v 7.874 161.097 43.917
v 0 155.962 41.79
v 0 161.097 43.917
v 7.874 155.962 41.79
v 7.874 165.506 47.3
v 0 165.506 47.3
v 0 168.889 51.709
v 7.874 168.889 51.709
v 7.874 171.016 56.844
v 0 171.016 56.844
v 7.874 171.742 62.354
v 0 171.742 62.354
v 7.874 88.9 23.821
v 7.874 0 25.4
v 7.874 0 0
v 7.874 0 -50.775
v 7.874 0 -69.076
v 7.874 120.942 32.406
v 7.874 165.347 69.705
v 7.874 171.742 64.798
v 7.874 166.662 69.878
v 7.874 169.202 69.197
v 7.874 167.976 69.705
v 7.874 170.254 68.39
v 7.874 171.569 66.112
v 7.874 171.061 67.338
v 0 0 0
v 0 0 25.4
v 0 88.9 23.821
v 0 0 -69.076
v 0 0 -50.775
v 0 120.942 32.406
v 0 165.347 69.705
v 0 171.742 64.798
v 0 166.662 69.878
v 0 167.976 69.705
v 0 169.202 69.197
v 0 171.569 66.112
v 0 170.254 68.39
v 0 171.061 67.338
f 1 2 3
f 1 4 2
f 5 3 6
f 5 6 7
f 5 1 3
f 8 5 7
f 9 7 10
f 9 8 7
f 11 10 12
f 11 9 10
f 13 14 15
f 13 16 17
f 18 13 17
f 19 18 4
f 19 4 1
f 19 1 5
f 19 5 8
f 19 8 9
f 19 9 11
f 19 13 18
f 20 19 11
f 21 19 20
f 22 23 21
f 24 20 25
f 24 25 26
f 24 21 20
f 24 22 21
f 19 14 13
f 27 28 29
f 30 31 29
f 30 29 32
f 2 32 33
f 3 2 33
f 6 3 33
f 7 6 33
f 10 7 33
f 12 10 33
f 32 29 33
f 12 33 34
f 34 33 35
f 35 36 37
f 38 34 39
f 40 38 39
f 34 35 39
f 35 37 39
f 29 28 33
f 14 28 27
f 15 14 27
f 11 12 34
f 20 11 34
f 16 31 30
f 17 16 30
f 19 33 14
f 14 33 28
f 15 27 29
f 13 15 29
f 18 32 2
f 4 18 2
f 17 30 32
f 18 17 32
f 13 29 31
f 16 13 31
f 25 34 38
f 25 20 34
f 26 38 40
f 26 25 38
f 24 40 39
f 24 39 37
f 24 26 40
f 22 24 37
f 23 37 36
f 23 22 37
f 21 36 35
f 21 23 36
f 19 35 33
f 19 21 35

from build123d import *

# Parameters (mm, degrees)
F1_DEPTH = 7.874
F2_R     = 21.289722
F3_R     = 5.08


with BuildPart() as f1:
    # F0 (on Right) → F1 (new body)
    with BuildSketch(Plane.YZ):
        Polygon((0, 25.4), (0, 0), (88.9, 23.820683), (120.941612, 32.406207), (171.741612, 46.018026), (171.741612, 71.418026), align=None)
        Polygon((120.941612, 32.406207), (88.9, 23.820683), (0, -50.775274), (0, -69.075855), align=None)
    extrude(amount=F1_DEPTH)

    # F2
    f2_edges = [f1.edges().sort_by_distance(p)[0] for p in [
        (3.937, 171.741612, 46.018026),
    ]]
    fillet(f2_edges, radius=F2_R)

    # F3
    f3_edges = [f1.edges().sort_by_distance(p)[0] for p in [
        (3.937, 171.741612, 71.418026),
    ]]
    fillet(f3_edges, radius=F3_R)


solid = f1.part
